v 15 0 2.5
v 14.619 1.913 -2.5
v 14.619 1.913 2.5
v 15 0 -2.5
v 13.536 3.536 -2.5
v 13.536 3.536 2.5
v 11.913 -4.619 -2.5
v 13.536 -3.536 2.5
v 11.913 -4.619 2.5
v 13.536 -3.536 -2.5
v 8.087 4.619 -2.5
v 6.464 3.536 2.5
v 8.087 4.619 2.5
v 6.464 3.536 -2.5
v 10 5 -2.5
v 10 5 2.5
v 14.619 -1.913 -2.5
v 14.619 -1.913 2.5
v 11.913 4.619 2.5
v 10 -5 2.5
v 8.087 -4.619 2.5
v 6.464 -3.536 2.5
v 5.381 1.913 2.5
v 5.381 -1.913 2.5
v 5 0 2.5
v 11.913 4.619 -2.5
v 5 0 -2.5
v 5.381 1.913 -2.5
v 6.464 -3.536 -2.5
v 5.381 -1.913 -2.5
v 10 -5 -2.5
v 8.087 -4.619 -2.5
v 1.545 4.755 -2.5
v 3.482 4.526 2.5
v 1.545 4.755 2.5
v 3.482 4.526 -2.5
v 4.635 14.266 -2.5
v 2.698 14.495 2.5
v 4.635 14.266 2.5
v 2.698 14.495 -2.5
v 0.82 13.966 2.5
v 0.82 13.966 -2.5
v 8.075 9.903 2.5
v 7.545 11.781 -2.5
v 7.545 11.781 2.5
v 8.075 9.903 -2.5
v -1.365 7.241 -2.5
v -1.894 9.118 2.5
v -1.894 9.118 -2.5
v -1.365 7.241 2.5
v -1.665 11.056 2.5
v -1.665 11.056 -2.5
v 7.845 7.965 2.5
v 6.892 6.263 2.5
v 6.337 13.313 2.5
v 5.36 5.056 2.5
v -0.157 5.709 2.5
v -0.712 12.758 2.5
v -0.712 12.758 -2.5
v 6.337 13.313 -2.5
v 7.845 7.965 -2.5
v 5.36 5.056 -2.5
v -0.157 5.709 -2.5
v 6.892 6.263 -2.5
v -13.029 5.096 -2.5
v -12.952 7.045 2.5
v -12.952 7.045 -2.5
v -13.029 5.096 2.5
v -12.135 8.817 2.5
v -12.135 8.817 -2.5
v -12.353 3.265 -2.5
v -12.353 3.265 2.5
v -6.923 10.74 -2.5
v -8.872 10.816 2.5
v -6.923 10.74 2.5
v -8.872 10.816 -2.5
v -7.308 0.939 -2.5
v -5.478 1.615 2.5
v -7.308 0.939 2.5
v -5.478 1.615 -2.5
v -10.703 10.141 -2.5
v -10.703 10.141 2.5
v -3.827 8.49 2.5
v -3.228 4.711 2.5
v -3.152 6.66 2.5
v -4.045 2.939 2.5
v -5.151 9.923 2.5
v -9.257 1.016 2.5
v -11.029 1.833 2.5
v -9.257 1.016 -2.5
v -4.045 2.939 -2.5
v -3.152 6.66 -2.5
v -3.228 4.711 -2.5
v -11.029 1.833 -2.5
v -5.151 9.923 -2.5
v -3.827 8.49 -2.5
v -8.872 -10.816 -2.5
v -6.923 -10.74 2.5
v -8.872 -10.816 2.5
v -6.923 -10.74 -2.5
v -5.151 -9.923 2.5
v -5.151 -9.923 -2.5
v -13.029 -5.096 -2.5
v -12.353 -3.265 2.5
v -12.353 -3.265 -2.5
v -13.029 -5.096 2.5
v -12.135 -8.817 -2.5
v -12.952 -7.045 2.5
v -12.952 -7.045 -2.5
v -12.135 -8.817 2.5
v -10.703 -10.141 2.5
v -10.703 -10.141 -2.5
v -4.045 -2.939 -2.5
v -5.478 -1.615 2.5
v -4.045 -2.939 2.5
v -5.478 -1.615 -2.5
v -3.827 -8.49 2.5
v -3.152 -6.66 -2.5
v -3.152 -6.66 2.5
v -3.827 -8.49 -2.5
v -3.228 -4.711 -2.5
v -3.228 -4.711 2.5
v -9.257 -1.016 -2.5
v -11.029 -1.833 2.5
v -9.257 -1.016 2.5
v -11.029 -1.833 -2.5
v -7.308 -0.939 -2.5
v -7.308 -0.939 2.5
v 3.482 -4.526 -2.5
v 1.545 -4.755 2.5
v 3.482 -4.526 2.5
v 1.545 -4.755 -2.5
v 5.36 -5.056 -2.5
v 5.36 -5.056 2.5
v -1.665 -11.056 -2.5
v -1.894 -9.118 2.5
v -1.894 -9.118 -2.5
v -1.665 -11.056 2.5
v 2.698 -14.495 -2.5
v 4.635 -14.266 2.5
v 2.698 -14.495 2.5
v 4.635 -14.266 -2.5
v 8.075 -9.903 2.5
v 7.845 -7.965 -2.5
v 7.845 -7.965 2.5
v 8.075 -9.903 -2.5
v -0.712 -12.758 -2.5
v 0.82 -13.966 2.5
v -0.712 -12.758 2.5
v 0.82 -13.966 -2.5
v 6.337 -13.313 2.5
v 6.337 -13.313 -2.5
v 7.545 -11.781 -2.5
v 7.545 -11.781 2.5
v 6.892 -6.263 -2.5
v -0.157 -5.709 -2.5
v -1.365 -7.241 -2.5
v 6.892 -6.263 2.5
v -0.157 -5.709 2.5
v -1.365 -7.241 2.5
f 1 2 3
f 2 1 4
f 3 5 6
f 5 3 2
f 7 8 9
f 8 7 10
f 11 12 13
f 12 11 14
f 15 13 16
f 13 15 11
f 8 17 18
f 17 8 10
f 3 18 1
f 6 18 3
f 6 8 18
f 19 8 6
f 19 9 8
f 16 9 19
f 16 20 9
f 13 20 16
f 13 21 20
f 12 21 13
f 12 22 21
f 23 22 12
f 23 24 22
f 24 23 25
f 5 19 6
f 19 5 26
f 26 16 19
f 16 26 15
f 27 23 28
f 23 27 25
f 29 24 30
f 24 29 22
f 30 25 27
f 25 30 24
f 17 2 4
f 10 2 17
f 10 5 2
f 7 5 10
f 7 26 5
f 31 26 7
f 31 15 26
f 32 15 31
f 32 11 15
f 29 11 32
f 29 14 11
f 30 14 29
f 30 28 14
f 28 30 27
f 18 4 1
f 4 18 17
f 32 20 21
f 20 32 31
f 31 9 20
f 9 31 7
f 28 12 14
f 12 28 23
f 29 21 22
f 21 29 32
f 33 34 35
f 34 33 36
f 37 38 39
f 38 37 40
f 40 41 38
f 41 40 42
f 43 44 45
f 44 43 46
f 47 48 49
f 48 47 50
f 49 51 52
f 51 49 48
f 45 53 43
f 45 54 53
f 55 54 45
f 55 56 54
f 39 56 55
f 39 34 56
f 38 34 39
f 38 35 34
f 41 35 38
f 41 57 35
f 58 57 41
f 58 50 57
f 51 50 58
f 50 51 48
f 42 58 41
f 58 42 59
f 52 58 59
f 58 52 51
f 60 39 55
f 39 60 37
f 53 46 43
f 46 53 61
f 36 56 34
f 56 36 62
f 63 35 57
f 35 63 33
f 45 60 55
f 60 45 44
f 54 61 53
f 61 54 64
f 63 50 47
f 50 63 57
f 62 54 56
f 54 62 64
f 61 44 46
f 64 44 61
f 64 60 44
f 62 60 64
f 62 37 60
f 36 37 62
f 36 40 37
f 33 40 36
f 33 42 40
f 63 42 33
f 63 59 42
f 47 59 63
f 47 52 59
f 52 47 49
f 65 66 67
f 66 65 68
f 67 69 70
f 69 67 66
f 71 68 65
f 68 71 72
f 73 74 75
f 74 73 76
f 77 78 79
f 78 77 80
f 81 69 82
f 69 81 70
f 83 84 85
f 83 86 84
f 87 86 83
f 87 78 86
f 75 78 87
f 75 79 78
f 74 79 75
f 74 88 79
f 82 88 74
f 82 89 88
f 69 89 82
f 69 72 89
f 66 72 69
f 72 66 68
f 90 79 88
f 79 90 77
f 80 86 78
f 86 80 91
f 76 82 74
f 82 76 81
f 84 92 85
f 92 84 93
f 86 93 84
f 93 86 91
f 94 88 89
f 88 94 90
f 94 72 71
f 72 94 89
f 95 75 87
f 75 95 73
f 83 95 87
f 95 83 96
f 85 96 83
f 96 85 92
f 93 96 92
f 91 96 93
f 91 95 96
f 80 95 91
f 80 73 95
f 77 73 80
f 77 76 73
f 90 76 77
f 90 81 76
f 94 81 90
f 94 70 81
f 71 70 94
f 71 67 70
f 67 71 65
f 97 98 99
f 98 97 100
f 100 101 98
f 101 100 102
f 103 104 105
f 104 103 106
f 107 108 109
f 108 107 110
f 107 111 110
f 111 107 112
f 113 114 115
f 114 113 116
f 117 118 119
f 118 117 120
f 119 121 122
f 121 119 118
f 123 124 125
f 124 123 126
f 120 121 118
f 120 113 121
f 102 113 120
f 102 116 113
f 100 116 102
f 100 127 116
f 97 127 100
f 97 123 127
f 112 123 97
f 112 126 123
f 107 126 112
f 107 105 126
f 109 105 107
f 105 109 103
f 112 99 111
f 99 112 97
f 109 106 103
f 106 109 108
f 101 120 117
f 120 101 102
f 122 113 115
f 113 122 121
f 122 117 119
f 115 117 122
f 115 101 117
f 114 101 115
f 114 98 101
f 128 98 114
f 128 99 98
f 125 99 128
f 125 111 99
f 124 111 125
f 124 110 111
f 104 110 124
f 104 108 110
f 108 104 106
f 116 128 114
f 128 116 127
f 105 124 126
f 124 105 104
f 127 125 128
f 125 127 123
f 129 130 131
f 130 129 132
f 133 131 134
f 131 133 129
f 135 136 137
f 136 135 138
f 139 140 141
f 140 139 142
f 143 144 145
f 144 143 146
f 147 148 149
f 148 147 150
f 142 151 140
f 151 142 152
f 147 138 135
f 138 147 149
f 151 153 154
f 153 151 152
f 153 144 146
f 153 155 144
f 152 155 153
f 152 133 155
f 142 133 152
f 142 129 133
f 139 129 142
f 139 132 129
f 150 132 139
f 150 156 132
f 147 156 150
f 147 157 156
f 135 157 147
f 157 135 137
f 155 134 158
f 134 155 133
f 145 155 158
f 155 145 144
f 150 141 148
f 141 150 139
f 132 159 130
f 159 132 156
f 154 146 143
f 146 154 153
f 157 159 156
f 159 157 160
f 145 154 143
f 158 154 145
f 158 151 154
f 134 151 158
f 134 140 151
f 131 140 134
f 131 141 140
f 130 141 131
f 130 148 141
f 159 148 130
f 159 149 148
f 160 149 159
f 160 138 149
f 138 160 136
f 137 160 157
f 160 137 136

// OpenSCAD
module pivot(number, r) {
	if (number == 1) {
		child(0);
	} else if (number > 1) {
		for (i = [0 : number - 1]) {
			rotate([0, 0, 360 / number * i]) {
				translate([r, 0, 0]) {
					child(0);
				}
			}
		}
	}
}

pivot(5, 10) {
	cylinder(r = 5, h = 5, center = true);
}
